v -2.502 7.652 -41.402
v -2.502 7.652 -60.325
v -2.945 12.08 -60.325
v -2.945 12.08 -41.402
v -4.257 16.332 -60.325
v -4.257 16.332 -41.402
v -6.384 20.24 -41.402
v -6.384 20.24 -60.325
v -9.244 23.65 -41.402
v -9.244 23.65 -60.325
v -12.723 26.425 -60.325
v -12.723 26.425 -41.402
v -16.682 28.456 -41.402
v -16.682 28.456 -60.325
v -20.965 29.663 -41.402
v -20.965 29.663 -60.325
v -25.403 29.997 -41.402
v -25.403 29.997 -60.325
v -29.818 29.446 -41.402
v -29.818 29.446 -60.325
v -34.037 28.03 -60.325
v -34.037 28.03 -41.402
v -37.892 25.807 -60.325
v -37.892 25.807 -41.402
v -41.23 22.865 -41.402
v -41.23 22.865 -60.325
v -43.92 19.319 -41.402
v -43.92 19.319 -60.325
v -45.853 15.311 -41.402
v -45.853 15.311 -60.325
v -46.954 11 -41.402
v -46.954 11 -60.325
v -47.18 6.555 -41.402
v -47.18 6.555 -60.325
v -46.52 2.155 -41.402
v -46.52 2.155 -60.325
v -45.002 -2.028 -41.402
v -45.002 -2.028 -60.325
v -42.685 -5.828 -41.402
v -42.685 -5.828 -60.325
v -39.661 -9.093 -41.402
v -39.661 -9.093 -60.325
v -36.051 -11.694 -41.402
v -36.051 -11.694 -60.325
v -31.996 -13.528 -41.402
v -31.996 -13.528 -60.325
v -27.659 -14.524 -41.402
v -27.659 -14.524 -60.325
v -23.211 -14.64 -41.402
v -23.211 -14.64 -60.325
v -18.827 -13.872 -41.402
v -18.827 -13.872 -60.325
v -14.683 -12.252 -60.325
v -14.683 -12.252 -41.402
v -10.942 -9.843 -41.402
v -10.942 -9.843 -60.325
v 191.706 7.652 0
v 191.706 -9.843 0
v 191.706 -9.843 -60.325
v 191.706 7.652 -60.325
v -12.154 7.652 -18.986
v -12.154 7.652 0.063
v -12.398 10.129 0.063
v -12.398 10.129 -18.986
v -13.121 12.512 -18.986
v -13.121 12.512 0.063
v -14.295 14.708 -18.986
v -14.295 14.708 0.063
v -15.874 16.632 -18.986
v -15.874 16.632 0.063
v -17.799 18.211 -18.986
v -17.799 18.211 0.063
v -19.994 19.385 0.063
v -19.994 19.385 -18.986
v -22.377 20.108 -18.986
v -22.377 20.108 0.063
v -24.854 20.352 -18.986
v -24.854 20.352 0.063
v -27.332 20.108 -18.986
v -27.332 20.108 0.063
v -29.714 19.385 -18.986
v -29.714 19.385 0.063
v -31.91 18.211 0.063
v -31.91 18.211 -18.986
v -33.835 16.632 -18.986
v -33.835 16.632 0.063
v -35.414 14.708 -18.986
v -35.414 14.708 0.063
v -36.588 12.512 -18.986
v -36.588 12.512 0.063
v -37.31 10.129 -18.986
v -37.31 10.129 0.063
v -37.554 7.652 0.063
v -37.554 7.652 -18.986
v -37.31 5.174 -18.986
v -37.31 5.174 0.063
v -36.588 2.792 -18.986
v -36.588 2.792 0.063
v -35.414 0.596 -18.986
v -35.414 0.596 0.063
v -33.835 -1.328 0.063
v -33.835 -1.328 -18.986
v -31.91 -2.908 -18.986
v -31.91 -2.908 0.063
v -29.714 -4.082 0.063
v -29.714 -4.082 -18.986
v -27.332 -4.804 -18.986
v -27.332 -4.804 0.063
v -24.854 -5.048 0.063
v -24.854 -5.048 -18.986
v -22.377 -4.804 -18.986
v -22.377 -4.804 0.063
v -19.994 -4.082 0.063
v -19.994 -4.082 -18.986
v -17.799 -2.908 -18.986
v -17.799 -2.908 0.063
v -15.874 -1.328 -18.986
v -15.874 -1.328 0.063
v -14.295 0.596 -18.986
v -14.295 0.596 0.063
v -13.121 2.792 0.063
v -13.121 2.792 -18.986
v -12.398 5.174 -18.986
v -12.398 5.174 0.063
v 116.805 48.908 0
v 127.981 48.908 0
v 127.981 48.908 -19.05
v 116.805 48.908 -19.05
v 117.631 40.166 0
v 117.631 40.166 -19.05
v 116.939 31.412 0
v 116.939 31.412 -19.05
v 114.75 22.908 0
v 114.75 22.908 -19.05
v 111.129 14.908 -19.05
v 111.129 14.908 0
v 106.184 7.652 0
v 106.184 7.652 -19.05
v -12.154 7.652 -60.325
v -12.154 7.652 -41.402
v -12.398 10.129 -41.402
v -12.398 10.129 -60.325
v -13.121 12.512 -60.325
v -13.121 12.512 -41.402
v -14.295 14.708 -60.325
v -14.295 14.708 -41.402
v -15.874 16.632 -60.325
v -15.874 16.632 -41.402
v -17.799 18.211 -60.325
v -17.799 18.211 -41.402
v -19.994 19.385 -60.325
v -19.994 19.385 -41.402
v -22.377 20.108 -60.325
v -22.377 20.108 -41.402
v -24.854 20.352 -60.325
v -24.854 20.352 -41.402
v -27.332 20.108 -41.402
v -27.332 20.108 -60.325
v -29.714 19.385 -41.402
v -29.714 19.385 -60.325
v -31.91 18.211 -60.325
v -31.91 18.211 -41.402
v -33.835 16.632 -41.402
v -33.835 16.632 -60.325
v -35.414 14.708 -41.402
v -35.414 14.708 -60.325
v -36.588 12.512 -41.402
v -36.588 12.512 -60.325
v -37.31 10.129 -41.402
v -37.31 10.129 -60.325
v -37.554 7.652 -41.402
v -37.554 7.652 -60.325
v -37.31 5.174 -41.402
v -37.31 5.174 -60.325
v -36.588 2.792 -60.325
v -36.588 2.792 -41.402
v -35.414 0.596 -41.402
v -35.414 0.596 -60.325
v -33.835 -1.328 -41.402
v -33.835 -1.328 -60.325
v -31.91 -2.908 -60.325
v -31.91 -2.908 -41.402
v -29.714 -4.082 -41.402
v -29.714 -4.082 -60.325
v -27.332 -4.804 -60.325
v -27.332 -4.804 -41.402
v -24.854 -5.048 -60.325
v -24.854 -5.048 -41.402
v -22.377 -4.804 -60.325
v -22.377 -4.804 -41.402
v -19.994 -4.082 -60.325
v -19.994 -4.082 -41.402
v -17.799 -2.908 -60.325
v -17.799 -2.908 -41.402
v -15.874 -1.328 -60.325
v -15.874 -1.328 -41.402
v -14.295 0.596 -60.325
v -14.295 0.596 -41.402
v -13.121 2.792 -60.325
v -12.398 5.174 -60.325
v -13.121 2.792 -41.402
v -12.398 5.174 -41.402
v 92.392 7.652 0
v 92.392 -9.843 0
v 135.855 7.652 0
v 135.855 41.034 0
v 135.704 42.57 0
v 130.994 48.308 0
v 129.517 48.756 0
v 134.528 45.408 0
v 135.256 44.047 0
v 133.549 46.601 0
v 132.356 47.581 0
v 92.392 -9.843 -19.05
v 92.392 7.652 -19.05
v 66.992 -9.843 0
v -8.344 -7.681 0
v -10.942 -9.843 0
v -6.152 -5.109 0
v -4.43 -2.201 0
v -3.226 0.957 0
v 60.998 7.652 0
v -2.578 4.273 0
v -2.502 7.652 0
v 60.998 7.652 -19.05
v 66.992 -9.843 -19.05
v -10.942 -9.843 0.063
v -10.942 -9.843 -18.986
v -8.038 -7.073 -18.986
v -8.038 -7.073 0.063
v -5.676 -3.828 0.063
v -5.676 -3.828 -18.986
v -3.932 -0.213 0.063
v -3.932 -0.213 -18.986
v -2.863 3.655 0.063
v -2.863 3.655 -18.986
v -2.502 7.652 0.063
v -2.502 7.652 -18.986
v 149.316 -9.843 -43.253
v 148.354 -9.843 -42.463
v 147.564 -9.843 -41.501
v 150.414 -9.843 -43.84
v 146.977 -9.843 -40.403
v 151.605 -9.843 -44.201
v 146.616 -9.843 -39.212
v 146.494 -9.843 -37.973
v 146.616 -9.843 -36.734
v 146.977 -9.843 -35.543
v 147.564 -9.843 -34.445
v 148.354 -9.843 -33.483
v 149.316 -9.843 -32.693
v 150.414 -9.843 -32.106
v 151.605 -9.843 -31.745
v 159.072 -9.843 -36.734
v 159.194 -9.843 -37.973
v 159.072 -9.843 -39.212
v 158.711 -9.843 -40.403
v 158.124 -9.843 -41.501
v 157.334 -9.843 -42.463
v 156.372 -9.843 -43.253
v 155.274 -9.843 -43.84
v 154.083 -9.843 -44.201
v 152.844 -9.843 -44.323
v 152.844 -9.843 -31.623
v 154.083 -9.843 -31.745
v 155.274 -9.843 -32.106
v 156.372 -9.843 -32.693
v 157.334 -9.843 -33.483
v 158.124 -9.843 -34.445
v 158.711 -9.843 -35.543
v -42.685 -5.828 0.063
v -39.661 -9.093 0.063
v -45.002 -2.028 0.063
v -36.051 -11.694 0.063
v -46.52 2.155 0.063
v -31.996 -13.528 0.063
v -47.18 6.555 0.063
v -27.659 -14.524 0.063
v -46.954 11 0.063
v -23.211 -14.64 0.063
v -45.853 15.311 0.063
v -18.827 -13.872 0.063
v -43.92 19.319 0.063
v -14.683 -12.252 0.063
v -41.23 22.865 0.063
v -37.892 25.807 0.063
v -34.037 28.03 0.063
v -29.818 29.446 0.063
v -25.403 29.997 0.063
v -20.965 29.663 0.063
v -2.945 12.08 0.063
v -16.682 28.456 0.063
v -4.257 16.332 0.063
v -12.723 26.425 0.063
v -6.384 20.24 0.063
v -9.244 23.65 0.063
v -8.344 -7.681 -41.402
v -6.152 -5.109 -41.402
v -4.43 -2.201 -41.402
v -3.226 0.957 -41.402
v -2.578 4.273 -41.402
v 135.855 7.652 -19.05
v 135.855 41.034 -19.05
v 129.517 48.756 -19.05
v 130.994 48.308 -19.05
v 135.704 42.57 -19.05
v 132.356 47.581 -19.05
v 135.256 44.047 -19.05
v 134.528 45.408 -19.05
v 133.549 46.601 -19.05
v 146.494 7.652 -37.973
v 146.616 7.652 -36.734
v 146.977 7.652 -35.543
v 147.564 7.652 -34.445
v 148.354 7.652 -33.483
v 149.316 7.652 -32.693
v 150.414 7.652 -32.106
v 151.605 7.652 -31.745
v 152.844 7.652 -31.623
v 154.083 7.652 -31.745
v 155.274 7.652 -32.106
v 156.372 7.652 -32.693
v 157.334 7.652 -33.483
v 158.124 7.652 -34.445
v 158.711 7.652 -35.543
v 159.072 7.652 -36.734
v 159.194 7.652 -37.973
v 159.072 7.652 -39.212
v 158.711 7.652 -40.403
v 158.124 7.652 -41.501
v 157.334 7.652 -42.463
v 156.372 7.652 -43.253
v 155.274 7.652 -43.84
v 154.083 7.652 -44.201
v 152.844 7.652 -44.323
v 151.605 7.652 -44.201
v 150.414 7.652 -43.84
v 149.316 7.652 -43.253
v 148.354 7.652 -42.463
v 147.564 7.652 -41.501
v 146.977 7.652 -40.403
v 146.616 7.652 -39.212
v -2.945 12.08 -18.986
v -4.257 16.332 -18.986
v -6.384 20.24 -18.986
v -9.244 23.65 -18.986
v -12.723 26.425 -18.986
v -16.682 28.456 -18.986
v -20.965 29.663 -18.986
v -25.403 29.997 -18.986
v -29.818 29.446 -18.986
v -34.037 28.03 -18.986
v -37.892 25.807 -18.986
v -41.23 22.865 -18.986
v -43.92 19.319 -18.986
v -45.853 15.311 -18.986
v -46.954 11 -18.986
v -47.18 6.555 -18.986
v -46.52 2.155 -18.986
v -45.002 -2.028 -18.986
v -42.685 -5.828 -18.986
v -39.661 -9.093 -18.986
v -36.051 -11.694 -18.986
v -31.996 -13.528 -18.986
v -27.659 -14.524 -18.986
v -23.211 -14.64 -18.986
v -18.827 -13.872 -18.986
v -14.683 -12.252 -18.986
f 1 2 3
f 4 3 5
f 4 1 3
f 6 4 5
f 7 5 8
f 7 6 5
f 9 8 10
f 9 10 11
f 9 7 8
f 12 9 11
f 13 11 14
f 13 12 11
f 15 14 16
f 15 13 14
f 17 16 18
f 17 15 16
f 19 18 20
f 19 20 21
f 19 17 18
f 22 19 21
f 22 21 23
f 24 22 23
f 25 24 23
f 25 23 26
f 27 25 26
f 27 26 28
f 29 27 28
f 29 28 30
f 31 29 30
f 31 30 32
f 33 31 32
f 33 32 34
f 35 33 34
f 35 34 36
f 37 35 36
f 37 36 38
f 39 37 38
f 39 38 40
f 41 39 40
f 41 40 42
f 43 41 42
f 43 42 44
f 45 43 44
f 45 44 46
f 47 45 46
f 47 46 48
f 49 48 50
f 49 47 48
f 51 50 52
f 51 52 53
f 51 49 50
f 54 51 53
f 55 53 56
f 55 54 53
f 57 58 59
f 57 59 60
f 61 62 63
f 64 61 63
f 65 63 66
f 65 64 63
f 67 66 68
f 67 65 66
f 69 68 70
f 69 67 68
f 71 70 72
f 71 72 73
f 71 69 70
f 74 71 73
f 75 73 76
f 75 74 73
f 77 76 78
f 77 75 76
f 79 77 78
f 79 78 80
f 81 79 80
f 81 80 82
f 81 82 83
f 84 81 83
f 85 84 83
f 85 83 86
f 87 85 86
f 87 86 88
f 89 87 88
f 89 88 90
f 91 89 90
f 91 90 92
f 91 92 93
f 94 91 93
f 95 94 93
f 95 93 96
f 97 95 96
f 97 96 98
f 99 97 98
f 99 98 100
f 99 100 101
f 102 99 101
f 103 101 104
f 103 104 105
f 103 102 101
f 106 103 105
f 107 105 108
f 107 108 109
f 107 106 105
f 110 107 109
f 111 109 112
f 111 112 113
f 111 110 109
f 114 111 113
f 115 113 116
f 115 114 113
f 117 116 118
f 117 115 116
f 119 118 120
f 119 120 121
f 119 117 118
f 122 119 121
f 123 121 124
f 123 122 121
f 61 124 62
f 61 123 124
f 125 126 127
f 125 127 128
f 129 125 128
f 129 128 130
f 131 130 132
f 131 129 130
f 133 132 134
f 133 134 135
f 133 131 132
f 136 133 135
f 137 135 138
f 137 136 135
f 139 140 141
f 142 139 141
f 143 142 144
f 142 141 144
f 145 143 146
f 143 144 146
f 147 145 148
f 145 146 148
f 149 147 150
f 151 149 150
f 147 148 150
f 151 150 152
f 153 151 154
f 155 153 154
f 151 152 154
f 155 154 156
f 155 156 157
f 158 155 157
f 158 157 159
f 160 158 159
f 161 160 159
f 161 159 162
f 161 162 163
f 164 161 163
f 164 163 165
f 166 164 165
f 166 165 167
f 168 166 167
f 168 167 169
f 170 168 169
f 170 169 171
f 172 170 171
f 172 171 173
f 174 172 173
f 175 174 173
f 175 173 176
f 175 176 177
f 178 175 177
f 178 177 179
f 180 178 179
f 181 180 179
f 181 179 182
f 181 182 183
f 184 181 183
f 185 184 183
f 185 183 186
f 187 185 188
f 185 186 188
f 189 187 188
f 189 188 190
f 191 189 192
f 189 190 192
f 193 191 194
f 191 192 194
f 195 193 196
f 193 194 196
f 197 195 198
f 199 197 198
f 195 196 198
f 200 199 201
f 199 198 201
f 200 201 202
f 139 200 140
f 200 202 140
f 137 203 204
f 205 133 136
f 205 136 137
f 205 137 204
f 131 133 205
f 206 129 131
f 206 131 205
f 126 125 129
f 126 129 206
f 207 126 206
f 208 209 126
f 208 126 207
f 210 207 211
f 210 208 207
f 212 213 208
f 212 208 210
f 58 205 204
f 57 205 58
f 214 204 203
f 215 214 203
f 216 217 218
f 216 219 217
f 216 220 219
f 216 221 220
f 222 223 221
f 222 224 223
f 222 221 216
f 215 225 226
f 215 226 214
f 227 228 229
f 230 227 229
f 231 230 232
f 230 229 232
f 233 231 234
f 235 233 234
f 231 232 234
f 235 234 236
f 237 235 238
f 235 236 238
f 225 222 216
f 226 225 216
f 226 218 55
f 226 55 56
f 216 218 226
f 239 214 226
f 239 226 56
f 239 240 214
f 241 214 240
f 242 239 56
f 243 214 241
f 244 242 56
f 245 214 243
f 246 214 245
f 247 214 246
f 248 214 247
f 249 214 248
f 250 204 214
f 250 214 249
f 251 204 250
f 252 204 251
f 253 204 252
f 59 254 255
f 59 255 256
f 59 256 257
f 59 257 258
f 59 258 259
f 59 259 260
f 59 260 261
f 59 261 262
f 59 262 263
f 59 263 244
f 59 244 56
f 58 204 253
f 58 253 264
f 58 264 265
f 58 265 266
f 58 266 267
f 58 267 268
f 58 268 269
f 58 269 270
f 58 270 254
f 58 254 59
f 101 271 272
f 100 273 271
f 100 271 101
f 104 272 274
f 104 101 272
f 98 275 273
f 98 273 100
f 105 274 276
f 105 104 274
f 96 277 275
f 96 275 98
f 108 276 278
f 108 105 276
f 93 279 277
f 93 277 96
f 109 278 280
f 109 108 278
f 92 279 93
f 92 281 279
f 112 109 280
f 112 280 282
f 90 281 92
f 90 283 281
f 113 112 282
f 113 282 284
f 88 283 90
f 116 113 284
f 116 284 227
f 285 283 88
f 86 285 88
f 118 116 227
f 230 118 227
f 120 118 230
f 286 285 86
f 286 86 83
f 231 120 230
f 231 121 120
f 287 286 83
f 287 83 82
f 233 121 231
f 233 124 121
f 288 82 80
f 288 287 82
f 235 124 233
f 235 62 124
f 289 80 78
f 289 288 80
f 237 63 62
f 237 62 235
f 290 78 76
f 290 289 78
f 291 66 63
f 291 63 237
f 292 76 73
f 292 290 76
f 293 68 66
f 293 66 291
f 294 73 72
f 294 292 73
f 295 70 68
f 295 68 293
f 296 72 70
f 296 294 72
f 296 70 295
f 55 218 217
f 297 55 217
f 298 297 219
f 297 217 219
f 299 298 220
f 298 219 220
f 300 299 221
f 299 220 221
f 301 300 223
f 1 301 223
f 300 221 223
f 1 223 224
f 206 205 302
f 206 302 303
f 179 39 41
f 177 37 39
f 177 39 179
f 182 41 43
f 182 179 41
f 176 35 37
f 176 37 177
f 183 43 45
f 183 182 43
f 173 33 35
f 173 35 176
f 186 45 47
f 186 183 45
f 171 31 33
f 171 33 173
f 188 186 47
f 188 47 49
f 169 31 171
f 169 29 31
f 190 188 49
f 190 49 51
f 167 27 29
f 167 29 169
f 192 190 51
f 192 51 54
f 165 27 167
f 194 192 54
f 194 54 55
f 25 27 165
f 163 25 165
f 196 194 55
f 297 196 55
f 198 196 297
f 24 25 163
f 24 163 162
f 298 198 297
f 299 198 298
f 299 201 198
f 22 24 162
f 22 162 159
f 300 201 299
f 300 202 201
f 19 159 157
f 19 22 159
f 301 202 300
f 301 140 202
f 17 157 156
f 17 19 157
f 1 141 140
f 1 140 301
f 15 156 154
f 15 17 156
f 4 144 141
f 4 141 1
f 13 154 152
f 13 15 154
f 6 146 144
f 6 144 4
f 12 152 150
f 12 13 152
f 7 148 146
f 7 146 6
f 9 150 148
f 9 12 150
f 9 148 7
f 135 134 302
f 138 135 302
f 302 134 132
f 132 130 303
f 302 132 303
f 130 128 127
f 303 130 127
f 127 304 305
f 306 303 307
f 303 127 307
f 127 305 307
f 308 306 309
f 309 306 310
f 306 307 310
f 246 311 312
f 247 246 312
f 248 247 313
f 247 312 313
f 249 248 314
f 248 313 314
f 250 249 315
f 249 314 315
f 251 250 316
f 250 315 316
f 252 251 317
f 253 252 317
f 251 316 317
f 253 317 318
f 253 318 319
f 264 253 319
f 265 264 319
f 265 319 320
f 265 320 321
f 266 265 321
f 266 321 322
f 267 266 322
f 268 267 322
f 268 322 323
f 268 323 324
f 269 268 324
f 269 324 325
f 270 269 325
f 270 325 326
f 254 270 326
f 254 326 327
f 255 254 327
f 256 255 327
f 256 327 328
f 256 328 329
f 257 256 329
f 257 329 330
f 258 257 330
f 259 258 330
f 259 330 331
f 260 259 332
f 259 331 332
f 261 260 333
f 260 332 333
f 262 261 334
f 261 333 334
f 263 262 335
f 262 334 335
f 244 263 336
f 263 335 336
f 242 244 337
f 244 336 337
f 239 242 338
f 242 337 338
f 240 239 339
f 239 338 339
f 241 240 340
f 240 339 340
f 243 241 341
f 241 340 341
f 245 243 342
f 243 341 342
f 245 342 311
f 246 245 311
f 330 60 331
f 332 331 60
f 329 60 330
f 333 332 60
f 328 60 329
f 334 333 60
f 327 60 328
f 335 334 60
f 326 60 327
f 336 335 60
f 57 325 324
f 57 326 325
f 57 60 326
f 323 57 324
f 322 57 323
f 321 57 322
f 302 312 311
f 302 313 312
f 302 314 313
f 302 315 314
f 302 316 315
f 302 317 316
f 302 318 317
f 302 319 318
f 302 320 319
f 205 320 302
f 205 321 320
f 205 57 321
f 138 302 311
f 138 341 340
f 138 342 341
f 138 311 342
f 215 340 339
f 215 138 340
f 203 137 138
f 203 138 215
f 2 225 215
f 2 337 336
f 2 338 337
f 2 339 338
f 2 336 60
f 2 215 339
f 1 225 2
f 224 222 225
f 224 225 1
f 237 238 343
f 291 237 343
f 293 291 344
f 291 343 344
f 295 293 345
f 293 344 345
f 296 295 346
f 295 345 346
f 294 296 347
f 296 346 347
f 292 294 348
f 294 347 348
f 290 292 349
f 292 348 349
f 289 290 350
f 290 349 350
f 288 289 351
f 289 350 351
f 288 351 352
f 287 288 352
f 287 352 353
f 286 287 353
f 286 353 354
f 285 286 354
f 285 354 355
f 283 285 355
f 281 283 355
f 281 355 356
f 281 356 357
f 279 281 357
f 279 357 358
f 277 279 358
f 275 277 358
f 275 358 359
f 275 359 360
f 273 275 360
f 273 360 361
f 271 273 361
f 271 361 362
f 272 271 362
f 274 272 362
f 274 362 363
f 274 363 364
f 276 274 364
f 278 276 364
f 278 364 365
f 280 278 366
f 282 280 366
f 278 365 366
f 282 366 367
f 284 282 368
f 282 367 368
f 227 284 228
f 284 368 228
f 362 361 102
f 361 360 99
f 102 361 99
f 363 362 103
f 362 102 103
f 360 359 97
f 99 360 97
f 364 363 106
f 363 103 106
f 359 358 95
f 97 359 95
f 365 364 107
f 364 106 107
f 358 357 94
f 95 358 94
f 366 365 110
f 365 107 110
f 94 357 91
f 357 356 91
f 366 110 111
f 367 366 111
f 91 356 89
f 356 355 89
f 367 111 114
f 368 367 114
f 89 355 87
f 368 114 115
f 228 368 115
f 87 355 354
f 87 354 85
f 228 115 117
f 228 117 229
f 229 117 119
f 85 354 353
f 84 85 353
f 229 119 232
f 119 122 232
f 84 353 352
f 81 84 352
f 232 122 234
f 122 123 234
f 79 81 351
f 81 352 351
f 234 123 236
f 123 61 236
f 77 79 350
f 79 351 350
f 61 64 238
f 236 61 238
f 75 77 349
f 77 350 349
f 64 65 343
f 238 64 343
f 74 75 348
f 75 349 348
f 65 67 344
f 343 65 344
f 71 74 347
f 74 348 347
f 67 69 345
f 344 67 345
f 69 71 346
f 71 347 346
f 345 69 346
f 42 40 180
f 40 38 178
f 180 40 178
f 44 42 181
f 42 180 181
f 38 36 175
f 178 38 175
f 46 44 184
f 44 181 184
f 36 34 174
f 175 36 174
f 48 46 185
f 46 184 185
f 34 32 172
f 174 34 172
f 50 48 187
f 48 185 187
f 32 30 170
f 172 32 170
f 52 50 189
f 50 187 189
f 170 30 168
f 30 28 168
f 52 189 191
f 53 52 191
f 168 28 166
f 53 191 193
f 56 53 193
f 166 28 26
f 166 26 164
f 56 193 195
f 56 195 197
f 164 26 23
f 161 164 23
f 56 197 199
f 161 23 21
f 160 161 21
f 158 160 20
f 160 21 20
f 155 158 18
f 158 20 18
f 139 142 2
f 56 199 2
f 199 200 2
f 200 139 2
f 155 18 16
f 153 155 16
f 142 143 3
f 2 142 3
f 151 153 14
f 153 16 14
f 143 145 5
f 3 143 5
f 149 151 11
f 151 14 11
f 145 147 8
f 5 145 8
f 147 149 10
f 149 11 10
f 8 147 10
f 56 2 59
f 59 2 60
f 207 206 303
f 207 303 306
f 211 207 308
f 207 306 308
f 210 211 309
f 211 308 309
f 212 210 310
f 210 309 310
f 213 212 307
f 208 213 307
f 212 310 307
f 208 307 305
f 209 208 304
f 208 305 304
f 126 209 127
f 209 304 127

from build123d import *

# Parameters (mm, degrees)
F0_R      = 12.7
F1_DEPTH  = 60.325
F2_DEPTH  = 19.05
F3_R      = 7.874
F4_DEPTH  = 19.05
F5_R      = 6.35
F6_DEPTH  = 22.353
F9_R      = 12.7
F10_DEPTH = 41.402
F8_R      = 12.7
F11_DEPTH = 30.226
F12_DEPTH = 11.176


# Not quite as in the source:
# - a feature names something its author has since deleted; it is built from what else it names


with BuildPart() as f1:
    # F0 (on Top) → F1 (new body)
    with BuildSketch(Plane.XY):
        with BuildLine():
            Line((-10.9417234689, -9.842500207), (66.9919961198, -9.842500207))
            Line((66.9919961198, -9.842500207), (60.9975961198, 7.6517625031))
            Line((60.9975961198, 7.6517625031), (-2.5024038802, 7.6517625031))
            ThreePointArc((-2.5024038802, 7.6517625031), (-4.7224872234, -2.0599745054), (-10.9417234689, -9.842500207))
        make_face()
        Polygon((92.3919961198, 7.6517625031), (92.3919961198, -9.842500207), (191.7059961198, -9.842500207), (191.7059961198, 7.6517625031), (135.8551350103, 7.6517625031), (106.1841961198, 7.6517625031), align=None)
        with BuildLine():
            ThreePointArc((-2.5024038802, 7.6517625031), (-44.986320537, 17.3634995117), (-10.9417234689, -9.842500207))
            ThreePointArc((-10.9417234689, -9.842500207), (-4.7224872234, -2.0599745054), (-2.5024038802, 7.6517625031))
        make_face()
        with Locations((-24.8544038802, 7.6517625031)):
            Circle(F0_R, mode=Mode.SUBTRACT)
        Polygon((60.9975961198, 7.6517625031), (66.9919961198, -9.842500207), (92.3919961198, -9.842500207), (92.3919961198, 7.6517625031), align=None)
    extrude(amount=-F1_DEPTH)

    # F0 (on Top) → F2 (join)
    with BuildSketch(Plane.XY):
        with BuildLine():
            ThreePointArc((116.8051350103, 48.9077037828), (116.0282380438, 27.1126092147), (106.1841961198, 7.6517625031))
            Line((106.1841961198, 7.6517625031), (135.8551350103, 7.6517625031))
            Line((135.8551350103, 7.6517625031), (135.8551350103, 48.9077037828))
            Line((135.8551350103, 48.9077037828), (116.8051350103, 48.9077037828))
        make_face()
    extrude(amount=-F2_DEPTH)

    # F3
    f3_edges = [f1.edges().sort_by_distance(p)[0] for p in [
        (135.855135, 48.907704, -9.525),
    ]]
    fillet(f3_edges, radius=F3_R)

    # F0 (on Top) → F4 (cut)
    with BuildSketch(Plane.XY):
        Polygon((60.9975961198, 7.6517625031), (66.9919961198, -9.842500207), (92.3919961198, -9.842500207), (92.3919961198, 7.6517625031), align=None)
    extrude(amount=-F4_DEPTH, mode=Mode.SUBTRACT)

    # F5 (on face) → F6 (cut, through all)
    with BuildSketch(Plane(origin=(0, 7.6517625031, 0), x_dir=(-1, 0, 0), z_dir=(0, 1, 0))):
        with Locations((-152.8439961198, -37.973)):
            Circle(F5_R)
    extrude(amount=-F6_DEPTH, mode=Mode.SUBTRACT)

    # F9 (on face) → F10 (cut)
    with BuildSketch(Plane.XY):
        with BuildLine():
            ThreePointArc((-2.5024038802, 7.6517625031), (-44.986320537, 17.3634995117), (-10.9417234689, -9.842500207))
            ThreePointArc((-10.9417234689, -9.842500207), (-4.4297129577, -2.2012102715), (-2.5024038802, 7.6517625031))
        make_face()
        with Locations((-24.8544038802, 7.6517625031)):
            Circle(F9_R, mode=Mode.SUBTRACT)
    extrude(amount=-F10_DEPTH, mode=Mode.SUBTRACT)


with BuildPart() as f11:
    # F8 (on offset) → F11 (new body)
    with BuildSketch(Plane.XY.offset(-30.1625)):
        with BuildLine():
            ThreePointArc((-2.5024038802, 7.6517625031), (-44.986320537, 17.3634995117), (-10.9417234689, -9.842500207))
            ThreePointArc((-10.9417234689, -9.842500207), (-4.7224872234, -2.0599745054), (-2.5024038802, 7.6517625031))
        make_face()
        with Locations((-24.8544038802, 7.6517625031)):
            Circle(F8_R, mode=Mode.SUBTRACT)
    extrude(amount=F11_DEPTH)

    # F12 (cut): a face of the model
    f12_faces = [f11.faces().sort_by_distance(p)[0] for p in [
        (-38.373574265, 24.6512127415, -30.1625),
    ]]
    extrude(f12_faces, amount=-F12_DEPTH, mode=Mode.SUBTRACT)


solid = Compound([f1.part, f11.part])
